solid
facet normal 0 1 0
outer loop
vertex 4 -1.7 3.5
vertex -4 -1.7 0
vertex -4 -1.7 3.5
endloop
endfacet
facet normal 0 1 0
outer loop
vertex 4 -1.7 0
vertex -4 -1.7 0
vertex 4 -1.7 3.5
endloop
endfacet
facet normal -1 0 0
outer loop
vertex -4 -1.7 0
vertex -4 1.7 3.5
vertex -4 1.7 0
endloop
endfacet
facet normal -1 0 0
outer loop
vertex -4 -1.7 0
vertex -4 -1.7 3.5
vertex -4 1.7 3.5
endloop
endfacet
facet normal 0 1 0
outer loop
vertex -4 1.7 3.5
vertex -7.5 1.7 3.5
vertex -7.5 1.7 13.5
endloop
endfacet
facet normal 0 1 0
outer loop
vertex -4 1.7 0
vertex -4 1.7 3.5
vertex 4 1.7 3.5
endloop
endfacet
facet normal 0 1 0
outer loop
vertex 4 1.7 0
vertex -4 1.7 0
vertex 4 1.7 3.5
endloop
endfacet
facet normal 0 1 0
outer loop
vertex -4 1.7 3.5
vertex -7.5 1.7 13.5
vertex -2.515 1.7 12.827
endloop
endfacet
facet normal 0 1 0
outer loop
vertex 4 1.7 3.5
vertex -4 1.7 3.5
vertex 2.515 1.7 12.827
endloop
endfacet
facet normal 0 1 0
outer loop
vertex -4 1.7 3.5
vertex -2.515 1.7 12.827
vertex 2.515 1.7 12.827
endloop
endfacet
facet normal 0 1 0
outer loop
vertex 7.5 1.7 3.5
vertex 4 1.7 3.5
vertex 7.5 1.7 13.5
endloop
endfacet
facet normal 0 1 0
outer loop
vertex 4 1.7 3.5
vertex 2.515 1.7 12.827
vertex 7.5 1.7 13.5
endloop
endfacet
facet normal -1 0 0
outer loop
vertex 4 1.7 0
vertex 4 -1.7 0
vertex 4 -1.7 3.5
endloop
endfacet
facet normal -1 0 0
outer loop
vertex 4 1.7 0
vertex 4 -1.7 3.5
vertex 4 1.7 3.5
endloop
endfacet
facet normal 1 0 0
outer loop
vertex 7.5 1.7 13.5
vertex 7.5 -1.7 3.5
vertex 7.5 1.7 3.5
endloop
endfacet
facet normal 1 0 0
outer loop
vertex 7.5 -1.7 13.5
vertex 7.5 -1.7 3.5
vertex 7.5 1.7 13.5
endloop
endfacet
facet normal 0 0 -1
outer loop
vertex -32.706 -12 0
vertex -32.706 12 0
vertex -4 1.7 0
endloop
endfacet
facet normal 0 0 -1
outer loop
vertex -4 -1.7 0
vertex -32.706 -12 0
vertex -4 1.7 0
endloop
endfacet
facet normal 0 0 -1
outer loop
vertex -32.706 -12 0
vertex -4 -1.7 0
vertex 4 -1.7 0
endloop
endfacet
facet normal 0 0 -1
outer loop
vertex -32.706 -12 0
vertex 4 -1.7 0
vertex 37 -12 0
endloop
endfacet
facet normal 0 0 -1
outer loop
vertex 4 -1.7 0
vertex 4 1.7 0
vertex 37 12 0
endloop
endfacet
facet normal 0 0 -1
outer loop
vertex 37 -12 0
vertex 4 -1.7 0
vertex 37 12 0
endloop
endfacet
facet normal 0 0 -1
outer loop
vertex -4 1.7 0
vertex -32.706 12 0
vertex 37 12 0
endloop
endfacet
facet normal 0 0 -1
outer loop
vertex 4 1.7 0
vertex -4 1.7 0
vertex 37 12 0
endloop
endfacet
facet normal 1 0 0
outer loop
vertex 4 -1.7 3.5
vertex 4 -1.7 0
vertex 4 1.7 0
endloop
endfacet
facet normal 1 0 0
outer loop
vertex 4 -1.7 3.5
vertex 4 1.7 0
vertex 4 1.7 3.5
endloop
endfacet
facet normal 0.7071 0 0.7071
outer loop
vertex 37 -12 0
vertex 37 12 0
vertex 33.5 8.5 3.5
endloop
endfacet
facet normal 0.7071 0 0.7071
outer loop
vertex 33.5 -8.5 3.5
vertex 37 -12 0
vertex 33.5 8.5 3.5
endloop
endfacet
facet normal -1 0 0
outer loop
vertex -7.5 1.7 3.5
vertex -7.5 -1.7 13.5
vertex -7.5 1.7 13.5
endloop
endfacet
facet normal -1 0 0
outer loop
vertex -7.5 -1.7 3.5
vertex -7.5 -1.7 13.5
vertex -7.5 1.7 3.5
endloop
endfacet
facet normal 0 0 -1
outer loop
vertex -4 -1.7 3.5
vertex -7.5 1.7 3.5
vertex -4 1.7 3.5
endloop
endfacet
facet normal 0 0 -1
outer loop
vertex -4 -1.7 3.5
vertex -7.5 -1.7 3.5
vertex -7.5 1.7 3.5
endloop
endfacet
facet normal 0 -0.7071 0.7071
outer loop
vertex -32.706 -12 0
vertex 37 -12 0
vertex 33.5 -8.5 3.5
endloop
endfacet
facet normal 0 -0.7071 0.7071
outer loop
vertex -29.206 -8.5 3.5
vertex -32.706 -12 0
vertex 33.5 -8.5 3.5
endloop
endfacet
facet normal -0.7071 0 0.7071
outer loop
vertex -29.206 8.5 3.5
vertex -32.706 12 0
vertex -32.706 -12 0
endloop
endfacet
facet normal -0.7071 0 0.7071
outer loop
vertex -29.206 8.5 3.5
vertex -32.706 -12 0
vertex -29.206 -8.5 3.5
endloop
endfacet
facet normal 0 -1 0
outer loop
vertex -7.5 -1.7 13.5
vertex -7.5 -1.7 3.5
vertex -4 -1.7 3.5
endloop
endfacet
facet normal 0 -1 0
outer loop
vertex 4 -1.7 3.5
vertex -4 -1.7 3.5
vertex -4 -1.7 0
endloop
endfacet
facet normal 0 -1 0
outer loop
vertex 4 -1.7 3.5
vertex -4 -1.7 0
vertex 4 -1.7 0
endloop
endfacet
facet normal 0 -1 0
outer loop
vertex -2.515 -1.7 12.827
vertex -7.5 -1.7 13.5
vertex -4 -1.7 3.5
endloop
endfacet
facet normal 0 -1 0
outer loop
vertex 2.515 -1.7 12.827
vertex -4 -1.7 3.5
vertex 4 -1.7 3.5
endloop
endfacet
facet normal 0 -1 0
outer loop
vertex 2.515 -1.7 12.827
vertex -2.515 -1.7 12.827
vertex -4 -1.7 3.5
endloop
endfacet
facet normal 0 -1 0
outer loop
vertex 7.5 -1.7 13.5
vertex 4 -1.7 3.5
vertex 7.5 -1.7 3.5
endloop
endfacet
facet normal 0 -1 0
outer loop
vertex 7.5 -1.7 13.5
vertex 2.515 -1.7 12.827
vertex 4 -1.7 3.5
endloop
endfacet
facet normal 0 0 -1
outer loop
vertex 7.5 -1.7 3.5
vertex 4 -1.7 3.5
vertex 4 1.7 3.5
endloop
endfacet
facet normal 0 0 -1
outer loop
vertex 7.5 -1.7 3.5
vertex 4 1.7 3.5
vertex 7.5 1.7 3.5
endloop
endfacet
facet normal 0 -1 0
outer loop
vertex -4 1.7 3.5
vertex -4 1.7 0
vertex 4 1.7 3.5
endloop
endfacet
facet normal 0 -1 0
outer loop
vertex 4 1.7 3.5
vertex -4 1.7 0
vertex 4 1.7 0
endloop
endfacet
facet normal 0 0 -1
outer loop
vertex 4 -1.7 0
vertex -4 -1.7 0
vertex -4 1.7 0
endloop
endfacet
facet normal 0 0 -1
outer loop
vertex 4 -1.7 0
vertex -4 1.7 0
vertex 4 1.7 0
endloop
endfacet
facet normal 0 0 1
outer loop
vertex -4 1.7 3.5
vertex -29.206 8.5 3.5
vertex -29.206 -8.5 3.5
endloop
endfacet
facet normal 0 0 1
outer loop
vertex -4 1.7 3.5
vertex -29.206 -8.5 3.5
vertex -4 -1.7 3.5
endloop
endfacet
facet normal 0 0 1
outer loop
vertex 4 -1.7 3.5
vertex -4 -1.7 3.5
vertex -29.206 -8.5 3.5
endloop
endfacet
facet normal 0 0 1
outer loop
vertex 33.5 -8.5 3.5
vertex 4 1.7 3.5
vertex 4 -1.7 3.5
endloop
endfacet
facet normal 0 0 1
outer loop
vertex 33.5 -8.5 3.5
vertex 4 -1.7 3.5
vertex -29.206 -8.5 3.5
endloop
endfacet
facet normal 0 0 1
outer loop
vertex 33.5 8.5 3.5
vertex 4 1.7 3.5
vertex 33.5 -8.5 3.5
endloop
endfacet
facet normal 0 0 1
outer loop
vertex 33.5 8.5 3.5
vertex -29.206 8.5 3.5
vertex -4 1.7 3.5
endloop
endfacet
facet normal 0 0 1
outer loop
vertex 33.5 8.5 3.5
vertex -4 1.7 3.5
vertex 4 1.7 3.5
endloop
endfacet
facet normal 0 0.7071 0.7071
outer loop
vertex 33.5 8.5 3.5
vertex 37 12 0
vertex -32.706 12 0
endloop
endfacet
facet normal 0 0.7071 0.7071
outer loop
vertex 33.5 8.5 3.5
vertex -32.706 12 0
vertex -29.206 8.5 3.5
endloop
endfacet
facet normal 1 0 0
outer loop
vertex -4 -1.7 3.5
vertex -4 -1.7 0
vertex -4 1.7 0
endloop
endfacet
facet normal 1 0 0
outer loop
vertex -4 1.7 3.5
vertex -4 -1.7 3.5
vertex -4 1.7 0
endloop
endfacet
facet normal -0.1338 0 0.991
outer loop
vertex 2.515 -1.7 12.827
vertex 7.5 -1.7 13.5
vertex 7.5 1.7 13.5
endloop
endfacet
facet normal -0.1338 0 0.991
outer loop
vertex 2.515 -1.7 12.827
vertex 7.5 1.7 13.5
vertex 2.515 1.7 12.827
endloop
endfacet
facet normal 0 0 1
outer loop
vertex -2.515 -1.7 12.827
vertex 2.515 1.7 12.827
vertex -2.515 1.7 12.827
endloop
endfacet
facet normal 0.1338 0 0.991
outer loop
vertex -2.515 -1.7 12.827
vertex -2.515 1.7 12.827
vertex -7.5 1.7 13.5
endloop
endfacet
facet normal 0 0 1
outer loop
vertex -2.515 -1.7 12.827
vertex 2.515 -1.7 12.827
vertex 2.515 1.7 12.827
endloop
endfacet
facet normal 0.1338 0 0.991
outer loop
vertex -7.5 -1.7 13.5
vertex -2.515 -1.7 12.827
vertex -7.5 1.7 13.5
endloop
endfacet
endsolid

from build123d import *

# Parameters (mm, degrees)
F0_W        = 70.7058645785
F0_H        = 25
F1_DEPTH    = 3.5
F2_T1_DEPTH = 91.2793284822
F2_T3_DEPTH = 45.5734639037
F3_W        = 8
F3_H        = 3.4
F4_DEPTH    = 3.5
F6_DEPTH    = 1.7


# Not quite as in the source:
# - a fillet or chamfer that OpenCascade refuses, or shapes differently, is made with other operations: its cross-section is extruded or revolved along the edge and cut away or added


with BuildPart() as f1:
    # F0 (on Top) → F1 (new body)
    with BuildSketch(Plane.XY):
        with Locations((2.1470677108, 0)):
            Rectangle(F0_W, F0_H)
    extrude(amount=F1_DEPTH)

    # F2: chamfer of 4 on 4 edges, made by hand

    # F2_s2 → F2_t1 (cut)
    with BuildSketch(Plane.YZ.offset(-43.4925965303)):
        Polygon((-12.5, -0.5), (-8.5, 3.5), (-12.5, 3.5), align=None)
        Polygon((12.5, -0.5), (8.5, 3.5), (12.5, 3.5), align=None)
    extrude(amount=F2_T1_DEPTH, mode=Mode.SUBTRACT)

    # F2_s4 → F2_t3 (cut)
    with BuildSketch(Plane.XZ.offset(-22.7867319519)):
        Polygon((-33.2058645785, -0.5), (-29.2058645785, 3.5), (-33.2058645785, 3.5), align=None)
        Polygon((37.5, -0.5), (33.5, 3.5), (37.5, 3.5), align=None)
    extrude(amount=F2_T3_DEPTH, mode=Mode.SUBTRACT)

    # F3 (on Top) → F4 (cut)
    with BuildSketch(Plane.XY):
        Rectangle(F3_W, F3_H)
    extrude(amount=F4_DEPTH, mode=Mode.SUBTRACT)


with BuildPart() as f6:
    # F5 (on Front) → F6 (new body, symmetric)
    with BuildSketch(Plane.XZ):
        with BuildLine():
            Line((-4, 3.5), (-4, 0))
            Line((-4, 0), (4, 0))
            Line((4, 0), (4, 3.5))
            Line((4, 3.5), (7.5, 3.5))
            Line((7.5, 3.5), (7.5, 13.5))
            ThreePointArc((7.5, 13.5), (0, 12.7423461417), (-7.5, 13.5))
            Line((-7.5, 13.5), (-7.5, 3.5))
            Line((-7.5, 3.5), (-4, 3.5))
        make_face()
    extrude(amount=F6_DEPTH, both=True)


solid = Compound([f1.part, f6.part])
